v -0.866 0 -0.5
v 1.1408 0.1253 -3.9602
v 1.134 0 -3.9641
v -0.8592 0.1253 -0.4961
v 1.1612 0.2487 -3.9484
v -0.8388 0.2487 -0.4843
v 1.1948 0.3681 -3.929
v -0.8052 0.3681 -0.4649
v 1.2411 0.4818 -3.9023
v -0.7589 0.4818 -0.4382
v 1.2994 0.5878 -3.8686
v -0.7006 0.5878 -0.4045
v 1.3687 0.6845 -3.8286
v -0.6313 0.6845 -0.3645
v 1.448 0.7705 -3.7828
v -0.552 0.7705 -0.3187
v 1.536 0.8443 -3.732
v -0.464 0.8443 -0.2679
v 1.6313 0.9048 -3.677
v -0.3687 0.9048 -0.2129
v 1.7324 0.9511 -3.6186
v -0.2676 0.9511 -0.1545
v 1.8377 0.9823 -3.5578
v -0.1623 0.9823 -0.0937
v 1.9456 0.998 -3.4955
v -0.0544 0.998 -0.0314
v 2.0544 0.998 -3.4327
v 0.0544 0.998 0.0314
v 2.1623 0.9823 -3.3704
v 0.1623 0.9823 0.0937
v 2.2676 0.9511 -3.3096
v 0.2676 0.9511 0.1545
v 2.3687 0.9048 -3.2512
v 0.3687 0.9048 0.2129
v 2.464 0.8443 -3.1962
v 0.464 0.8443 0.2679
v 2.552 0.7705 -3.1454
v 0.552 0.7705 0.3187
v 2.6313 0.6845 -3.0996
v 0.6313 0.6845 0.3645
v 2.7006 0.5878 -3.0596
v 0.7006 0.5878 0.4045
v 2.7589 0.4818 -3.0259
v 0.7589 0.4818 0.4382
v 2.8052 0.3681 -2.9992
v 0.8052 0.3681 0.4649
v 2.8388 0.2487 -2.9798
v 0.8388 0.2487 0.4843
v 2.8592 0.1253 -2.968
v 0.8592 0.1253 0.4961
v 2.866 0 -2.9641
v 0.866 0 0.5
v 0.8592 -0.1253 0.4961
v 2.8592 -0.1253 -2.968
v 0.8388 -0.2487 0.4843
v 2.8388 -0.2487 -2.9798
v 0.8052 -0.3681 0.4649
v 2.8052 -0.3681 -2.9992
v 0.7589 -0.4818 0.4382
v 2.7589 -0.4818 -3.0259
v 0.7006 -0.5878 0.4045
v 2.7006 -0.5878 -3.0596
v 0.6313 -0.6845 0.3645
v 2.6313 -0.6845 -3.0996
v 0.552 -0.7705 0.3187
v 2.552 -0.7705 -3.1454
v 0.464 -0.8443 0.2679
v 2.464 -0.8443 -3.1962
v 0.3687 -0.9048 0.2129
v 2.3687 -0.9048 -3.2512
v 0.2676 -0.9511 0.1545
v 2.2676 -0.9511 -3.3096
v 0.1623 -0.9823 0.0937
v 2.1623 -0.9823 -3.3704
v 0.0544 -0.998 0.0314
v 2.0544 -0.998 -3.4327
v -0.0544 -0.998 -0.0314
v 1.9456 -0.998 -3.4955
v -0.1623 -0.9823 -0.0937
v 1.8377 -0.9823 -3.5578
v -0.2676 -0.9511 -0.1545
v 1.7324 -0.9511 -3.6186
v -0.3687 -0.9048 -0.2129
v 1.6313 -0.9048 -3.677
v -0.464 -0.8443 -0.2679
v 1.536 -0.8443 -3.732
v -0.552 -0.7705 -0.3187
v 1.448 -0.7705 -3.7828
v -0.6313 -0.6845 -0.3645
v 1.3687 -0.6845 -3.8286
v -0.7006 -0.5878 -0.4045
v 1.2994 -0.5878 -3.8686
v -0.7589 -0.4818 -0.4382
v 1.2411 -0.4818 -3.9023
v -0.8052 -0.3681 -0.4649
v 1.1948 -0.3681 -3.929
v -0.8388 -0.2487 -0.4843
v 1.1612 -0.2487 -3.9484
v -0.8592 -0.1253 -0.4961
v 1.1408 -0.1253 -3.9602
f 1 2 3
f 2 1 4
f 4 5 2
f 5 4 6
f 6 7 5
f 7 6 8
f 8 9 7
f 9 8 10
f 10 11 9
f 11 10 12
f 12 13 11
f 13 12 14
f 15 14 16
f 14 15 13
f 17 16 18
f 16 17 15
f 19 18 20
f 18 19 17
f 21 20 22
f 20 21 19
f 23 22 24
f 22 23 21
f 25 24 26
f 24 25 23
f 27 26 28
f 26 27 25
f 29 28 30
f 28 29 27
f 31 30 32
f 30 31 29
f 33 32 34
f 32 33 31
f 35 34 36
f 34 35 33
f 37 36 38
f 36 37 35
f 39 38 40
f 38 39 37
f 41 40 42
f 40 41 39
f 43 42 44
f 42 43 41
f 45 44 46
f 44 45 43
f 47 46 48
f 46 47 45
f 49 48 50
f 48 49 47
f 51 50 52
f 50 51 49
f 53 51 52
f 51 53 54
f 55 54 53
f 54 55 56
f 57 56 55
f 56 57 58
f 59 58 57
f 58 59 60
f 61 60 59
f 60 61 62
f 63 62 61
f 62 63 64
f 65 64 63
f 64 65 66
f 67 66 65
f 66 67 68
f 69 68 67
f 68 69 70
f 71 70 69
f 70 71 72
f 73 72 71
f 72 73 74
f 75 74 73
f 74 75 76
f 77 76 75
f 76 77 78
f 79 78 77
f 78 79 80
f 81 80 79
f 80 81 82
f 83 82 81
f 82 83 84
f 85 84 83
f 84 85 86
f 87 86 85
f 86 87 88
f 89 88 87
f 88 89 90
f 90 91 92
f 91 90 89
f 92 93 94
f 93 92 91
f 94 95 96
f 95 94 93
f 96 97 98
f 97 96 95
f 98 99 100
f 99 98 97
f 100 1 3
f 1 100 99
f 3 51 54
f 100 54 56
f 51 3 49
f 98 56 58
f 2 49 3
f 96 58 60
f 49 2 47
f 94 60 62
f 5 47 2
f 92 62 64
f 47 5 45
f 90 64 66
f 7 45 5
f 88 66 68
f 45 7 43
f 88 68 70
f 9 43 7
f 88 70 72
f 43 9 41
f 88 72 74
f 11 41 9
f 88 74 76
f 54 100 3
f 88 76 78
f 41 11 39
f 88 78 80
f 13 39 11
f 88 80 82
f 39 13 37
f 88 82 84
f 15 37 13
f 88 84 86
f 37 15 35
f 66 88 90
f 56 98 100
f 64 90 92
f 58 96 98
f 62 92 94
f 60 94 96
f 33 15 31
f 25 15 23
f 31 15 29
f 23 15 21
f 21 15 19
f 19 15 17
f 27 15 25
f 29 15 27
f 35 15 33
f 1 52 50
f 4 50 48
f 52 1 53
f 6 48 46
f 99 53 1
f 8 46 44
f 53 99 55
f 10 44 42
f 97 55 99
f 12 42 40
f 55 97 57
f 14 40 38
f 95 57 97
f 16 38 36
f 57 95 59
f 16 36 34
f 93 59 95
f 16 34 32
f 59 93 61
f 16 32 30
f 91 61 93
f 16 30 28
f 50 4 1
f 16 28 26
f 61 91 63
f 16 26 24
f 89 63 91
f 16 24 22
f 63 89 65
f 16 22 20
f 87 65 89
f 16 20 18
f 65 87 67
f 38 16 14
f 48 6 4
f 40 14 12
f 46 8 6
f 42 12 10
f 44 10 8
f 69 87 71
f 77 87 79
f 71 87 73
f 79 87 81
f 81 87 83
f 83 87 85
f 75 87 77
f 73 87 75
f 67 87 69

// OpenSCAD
$fn = 50;
// body
*cylinder(h = 10, r1 = 4, r2 = 0);

// head
*translate([0, 0, 9]) sphere(r=2.5);

// arms
mirror([1,0,0]) rotate(a=30, v=[0,1,0]) translate([0, 0, -4]) cylinder(h = 4, r = 1);
